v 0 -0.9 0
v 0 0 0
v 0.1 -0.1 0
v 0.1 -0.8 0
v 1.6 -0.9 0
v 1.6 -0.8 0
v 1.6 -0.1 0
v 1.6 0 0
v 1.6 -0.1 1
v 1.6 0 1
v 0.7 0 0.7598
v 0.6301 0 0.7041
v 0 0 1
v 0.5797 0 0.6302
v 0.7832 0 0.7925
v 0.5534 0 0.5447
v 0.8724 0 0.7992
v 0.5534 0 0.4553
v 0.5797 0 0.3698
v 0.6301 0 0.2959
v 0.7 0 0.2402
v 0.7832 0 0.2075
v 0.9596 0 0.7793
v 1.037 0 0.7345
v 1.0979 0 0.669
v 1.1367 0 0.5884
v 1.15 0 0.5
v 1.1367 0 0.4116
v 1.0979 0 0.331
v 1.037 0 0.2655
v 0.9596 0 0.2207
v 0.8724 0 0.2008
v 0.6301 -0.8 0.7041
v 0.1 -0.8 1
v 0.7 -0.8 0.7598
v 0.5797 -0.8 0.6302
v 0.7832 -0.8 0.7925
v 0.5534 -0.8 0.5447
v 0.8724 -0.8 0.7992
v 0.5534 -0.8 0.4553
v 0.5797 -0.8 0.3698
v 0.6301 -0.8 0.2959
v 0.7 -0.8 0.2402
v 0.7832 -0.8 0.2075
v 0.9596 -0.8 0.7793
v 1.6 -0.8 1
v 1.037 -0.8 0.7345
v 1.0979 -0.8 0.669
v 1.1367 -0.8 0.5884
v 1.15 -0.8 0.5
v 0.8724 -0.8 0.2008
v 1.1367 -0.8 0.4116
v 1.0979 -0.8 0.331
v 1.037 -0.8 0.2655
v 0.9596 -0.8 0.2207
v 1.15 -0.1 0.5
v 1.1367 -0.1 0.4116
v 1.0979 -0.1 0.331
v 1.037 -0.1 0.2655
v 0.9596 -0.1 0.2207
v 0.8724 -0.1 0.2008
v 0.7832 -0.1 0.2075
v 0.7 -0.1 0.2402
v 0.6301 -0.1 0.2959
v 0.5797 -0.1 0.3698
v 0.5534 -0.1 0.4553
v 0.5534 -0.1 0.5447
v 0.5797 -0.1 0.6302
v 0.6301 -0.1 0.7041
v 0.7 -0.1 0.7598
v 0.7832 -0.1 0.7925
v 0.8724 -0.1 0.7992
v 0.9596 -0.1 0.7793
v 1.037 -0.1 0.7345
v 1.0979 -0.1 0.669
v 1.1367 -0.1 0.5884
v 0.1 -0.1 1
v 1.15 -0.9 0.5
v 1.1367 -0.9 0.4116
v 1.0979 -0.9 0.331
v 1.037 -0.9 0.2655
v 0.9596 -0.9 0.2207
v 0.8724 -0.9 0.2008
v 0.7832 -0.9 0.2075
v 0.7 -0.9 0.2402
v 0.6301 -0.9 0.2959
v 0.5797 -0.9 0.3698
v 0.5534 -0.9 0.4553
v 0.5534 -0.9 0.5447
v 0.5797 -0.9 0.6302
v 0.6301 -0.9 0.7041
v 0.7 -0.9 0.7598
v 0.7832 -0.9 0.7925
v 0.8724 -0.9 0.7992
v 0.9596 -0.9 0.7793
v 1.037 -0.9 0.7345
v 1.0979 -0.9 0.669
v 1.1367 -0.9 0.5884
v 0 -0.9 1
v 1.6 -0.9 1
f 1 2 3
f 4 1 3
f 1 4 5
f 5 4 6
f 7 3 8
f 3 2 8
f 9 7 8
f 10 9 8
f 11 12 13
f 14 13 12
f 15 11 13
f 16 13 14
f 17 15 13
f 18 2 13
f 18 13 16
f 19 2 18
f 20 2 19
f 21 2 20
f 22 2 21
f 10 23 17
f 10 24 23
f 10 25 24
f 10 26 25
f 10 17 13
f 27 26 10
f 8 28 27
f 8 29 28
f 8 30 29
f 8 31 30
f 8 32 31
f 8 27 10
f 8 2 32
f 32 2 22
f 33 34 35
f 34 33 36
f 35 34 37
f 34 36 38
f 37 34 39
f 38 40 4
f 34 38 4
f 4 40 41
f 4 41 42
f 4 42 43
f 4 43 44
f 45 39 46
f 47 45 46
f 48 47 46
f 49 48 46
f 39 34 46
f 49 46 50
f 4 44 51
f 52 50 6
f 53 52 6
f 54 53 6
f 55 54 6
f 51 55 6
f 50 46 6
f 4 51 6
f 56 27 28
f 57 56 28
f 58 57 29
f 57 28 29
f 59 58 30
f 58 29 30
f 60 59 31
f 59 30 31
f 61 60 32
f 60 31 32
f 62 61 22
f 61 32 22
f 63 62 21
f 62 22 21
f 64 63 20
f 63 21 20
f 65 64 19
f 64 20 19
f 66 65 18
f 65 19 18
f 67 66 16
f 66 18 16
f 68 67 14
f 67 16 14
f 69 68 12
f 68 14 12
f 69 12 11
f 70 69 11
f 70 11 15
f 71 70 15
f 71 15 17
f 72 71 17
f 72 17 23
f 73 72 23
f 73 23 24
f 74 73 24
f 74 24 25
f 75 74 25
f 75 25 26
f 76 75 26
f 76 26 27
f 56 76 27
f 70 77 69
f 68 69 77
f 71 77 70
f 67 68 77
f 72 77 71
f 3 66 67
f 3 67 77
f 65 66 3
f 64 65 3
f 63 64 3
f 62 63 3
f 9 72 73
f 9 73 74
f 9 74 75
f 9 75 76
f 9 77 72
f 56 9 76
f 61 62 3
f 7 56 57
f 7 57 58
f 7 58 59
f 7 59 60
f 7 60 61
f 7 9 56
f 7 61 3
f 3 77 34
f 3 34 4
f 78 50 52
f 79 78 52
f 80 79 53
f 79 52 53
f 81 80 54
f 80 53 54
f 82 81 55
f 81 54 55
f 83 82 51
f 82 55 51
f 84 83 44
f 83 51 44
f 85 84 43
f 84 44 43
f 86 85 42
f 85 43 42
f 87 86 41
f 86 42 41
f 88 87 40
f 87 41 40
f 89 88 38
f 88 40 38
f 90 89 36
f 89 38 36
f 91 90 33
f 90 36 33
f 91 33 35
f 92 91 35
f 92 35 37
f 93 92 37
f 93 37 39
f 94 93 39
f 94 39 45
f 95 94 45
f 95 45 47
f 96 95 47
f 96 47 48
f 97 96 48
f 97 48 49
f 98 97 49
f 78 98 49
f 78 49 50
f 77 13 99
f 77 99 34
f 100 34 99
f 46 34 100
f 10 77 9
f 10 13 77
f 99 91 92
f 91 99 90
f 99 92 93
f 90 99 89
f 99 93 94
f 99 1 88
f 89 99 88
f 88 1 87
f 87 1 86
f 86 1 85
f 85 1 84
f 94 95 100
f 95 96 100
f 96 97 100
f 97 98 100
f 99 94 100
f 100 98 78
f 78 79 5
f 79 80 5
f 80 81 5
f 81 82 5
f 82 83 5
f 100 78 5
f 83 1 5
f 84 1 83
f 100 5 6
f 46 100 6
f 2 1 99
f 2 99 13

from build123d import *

# Parameters (mm, degrees)
SKETCH4_W           = 1.6
SKETCH4_H           = 0.9
BOSS_EXTRUDE3_DEPTH = 1
SKETCH6_R           = 0.3
CUT_EXTRUDE2_DEPTH  = 1
SKETCH7_W           = 1
SKETCH7_H           = 0.7
CUT_EXTRUDE3_DEPTH  = 1.5


with BuildPart() as part:
    # Sketch4 → Boss-Extrude3 (new body)
    with BuildSketch(Plane.XY):
        with Locations((0.8, -0.45)):
            Rectangle(SKETCH4_W, SKETCH4_H)
    extrude(amount=BOSS_EXTRUDE3_DEPTH)

    # Sketch6 → Cut-Extrude2 (cut)
    with BuildSketch(Plane(origin=(0, 0, 0), x_dir=(1, 0, 0), z_dir=(0, 1, 0))):
        with Locations((0.85, -0.5)):
            Circle(SKETCH6_R)
    extrude(amount=-CUT_EXTRUDE2_DEPTH, mode=Mode.SUBTRACT)

    # Sketch7 → Cut-Extrude3 (cut)
    with BuildSketch(Plane(origin=(1.6, 0, 0), x_dir=(0, 0, -1), z_dir=(1, 0, 0))):
        with Locations((-0.5, -0.45)):
            Rectangle(SKETCH7_W, SKETCH7_H)
    extrude(amount=-CUT_EXTRUDE3_DEPTH, mode=Mode.SUBTRACT)


solid = part.part
